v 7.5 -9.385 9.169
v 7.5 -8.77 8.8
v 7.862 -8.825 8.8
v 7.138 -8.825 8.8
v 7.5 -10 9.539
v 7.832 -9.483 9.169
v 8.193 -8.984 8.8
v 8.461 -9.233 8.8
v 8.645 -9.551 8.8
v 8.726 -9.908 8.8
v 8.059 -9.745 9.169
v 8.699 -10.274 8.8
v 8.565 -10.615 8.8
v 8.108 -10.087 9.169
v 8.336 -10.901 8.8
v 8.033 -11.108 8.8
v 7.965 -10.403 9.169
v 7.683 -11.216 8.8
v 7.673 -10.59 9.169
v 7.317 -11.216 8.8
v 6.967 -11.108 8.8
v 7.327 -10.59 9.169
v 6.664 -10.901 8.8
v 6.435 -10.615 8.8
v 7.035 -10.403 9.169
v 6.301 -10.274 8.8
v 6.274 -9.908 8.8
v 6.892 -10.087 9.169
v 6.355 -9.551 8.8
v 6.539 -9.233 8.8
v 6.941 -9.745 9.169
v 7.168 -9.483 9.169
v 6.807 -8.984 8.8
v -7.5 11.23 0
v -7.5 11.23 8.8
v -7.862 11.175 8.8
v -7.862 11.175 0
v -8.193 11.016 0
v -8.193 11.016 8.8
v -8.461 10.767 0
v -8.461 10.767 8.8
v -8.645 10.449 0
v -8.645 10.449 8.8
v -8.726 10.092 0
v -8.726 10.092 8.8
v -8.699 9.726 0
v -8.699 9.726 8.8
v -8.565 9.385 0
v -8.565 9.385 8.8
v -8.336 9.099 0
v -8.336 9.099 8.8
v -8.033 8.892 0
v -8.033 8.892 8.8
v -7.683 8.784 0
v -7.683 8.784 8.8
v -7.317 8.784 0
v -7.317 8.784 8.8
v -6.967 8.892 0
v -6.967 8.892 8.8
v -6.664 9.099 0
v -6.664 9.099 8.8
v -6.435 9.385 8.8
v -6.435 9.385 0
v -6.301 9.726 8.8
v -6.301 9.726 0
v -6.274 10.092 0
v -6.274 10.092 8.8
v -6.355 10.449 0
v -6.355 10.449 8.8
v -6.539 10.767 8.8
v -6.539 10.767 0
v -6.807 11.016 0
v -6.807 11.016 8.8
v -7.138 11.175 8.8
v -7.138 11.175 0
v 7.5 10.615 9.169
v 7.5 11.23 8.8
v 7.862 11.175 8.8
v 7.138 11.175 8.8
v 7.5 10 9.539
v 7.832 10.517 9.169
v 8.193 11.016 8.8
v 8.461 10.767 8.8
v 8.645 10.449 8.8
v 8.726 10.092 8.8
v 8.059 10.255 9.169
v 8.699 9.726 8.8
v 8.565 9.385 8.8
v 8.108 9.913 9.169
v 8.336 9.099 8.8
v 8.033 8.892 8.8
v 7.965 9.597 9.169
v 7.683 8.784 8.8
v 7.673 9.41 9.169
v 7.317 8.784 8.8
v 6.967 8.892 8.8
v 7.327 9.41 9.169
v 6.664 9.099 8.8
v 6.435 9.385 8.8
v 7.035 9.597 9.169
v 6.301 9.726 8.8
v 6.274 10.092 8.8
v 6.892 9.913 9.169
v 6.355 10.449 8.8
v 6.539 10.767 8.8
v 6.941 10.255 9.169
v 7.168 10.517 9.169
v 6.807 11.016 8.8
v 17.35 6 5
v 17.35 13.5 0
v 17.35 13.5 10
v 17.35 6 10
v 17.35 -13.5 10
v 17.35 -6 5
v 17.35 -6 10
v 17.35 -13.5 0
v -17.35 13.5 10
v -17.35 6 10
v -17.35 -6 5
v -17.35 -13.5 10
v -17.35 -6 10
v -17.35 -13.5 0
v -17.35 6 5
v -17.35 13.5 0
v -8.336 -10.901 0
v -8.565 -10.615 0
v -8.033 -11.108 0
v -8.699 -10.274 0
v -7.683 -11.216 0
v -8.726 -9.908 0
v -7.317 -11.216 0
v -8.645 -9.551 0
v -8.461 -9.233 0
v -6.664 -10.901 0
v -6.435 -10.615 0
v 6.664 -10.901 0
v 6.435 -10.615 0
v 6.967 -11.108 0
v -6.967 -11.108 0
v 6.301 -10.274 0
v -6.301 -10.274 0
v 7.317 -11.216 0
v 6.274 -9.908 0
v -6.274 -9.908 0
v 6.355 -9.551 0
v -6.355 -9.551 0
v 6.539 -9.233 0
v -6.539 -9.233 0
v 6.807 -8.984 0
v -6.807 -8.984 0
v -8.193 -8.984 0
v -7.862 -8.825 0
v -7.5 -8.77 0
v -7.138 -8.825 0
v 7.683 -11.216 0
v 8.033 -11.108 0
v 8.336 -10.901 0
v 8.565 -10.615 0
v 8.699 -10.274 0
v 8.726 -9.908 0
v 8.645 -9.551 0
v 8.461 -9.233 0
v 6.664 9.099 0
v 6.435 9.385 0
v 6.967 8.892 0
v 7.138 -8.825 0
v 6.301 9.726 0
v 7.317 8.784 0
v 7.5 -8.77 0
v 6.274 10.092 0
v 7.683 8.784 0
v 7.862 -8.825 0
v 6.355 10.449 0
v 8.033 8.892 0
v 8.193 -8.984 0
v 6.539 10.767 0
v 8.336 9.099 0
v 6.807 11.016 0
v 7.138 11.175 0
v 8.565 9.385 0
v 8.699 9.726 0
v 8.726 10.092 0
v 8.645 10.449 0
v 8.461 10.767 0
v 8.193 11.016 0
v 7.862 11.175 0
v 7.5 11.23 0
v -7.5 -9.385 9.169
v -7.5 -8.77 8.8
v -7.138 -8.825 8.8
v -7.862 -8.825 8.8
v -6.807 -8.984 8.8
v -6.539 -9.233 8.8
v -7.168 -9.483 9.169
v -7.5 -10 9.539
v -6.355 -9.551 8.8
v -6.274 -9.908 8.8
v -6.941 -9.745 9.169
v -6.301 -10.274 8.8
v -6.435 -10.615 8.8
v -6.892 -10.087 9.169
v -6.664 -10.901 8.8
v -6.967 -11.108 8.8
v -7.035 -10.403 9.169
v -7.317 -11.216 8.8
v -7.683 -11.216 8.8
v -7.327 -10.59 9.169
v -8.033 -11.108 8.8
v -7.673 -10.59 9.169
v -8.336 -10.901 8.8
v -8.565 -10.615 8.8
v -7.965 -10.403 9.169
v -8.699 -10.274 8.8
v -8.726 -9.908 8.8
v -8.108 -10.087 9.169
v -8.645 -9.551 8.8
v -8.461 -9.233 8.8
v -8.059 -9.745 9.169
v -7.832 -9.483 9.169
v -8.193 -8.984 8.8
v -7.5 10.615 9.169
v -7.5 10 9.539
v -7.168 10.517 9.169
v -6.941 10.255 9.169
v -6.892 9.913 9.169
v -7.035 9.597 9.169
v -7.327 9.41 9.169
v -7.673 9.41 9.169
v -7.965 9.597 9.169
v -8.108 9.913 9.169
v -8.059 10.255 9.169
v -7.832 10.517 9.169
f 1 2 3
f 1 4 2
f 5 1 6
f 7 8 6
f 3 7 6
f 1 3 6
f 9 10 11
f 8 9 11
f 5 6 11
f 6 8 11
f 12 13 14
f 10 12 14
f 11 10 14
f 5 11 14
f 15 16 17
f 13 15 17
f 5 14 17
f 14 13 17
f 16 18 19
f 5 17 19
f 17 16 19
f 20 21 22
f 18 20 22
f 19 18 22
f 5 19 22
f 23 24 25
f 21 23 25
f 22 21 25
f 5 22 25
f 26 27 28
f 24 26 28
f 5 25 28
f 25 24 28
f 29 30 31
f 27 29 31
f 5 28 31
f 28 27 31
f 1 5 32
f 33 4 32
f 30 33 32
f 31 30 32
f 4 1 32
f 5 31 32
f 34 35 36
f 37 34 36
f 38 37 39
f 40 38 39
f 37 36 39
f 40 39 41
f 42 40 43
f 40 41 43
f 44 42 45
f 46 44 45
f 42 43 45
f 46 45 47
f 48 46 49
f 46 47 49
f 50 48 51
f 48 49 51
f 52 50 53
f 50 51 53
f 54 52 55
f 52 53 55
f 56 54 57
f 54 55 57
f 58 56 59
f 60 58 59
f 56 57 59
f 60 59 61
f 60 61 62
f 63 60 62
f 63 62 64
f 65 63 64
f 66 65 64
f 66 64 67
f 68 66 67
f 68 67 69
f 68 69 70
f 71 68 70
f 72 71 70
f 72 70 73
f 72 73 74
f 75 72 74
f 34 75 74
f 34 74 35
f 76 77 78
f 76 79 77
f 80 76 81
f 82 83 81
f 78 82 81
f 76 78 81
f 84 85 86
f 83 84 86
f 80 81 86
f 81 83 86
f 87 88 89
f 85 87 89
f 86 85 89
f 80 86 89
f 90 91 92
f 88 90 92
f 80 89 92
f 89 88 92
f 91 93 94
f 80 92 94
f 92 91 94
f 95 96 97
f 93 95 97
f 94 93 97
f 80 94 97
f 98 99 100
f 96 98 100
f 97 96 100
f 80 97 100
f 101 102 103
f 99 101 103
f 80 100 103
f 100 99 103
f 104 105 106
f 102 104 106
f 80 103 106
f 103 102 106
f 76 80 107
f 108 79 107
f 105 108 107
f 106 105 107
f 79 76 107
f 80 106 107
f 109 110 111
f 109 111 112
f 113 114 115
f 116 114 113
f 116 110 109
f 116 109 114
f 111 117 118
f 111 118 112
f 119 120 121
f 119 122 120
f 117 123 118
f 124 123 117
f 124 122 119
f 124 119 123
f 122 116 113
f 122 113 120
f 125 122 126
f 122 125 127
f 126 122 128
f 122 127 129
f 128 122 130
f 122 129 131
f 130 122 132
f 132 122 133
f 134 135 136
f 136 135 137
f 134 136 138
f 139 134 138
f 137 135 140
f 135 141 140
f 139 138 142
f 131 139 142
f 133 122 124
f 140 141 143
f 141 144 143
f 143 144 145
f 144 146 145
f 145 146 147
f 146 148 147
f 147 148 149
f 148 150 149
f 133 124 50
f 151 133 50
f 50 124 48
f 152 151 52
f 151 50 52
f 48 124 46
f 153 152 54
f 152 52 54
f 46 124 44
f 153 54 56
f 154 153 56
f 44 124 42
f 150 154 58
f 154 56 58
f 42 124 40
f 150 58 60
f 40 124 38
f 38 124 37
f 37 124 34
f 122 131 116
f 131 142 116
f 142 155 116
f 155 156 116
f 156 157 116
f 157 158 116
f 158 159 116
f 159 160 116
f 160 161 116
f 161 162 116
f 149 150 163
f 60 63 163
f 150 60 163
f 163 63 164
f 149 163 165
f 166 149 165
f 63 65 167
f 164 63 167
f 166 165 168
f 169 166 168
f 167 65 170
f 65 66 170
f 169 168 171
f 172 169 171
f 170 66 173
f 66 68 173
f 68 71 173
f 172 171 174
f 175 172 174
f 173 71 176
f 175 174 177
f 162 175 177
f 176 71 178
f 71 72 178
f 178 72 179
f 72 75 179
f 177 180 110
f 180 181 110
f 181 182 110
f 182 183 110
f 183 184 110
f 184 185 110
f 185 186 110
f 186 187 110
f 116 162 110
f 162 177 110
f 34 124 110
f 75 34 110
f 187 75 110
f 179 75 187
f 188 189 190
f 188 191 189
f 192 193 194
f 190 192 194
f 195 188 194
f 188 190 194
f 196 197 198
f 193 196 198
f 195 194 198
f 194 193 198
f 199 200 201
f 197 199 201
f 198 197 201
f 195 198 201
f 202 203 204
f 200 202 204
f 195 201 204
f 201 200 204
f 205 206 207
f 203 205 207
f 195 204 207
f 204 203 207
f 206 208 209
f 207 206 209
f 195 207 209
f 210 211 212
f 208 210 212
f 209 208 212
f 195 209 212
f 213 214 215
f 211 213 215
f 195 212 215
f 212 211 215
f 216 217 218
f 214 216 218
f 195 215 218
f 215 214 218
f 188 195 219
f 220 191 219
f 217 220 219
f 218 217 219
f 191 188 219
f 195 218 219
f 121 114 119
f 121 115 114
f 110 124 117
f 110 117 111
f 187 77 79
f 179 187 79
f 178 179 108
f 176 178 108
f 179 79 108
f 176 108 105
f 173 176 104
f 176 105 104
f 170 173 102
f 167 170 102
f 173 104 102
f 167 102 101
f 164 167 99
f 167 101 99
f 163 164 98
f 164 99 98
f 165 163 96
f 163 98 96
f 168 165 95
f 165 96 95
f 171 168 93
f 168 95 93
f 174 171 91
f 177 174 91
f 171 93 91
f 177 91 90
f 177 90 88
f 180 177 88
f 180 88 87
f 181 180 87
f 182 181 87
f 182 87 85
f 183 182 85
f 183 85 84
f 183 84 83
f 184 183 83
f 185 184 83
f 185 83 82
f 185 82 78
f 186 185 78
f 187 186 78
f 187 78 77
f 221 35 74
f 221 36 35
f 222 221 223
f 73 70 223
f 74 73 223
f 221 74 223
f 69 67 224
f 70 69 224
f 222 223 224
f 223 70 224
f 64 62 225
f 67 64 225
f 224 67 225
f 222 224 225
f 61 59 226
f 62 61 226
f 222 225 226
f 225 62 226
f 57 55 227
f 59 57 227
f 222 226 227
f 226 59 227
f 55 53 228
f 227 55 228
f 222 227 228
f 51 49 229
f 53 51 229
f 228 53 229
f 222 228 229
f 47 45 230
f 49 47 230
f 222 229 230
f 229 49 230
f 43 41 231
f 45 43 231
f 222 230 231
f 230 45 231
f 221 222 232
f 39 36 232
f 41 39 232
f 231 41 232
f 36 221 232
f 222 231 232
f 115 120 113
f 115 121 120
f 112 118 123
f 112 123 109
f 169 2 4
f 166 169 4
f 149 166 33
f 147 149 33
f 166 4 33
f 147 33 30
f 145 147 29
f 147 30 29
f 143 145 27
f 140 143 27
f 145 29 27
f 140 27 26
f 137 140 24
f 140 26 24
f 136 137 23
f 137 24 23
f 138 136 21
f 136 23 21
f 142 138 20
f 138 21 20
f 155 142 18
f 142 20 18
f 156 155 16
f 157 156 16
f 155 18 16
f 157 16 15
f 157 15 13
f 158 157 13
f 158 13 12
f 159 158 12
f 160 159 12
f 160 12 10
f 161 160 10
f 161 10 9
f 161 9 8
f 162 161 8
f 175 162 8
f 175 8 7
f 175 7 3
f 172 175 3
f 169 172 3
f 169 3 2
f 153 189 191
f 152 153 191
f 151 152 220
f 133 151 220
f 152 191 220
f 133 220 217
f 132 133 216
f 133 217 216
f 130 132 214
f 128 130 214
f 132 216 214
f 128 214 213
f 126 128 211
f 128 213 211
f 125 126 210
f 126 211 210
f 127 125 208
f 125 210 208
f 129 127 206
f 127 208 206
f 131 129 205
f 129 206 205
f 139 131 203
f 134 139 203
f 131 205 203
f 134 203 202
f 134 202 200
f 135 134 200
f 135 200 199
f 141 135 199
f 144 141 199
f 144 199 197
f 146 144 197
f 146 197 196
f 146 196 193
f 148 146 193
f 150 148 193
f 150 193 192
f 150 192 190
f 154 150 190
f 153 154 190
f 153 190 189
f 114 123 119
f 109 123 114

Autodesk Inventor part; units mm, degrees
ref_plane "YZ Plane" through (0, 0, 0) normal (1, 0, 0) x (0, 1, 0)
ref_plane "XZ Plane" through (0, 0, 0) normal (0, 1, 0) x (-1, 0, 0)
ref_plane "XY Plane" through (0, 0, 0) normal (0, 0, 1) x (1, 0, 0)
sketch "Sketch1" plane through (0, 0, 0) normal (0, 0, 1) x (1, 0, 0)
  line L0 (17.35, -13.5) -> (-17.35, -13.5)
  line L1 (-17.35, -13.5) -> (-17.35, 13.5)
  line L2 (-17.35, 13.5) -> (17.35, 13.5)
  line L3 (17.35, 13.5) -> (17.35, -13.5)
  line L4 (17.35, -13.5) -> (-17.35, 13.5) construction
  line L5 (-17.35, -13.5) -> (17.35, 13.5) construction
  point P0 (0, 0)
  dimension "d0" = 27
  dimension "d1" = 34.7
extrude "Extrusion1" add sketch "Sketch1" along normal blind 10
sketch "Sketch2" plane through (0, 0, 10) normal (0, 0, 1) x (1, 0, 0)
  line L0 (17.35, -6) -> (-17.35, -6)
  line L1 (-17.35, -6) -> (-17.35, 6)
  line L2 (-17.35, 6) -> (17.35, 6)
  line L3 (17.35, 6) -> (17.35, -6)
  line L4 (17.35, -6) -> (-17.35, 6) construction
  line L5 (-17.35, -6) -> (17.35, 6) construction
  point P0 (0, 0)
  point P1 (17.35, 13.5)
  dimension "d4" = 12
extrude "Extrusion2" cut sketch "Sketch2" against normal blind 5
sketch "Sketch3" plane through (0, 0, 0) normal (0, 0, -1) x (-1, 0, 0)
  point P0 (0, 0)
  point P1 (-7.5, 10)
  point P2 (-7.5, -10)
  point P3 (7.5, 10)
  point P4 (7.5, -10)
  dimension "d7" = 20
  dimension "d8" = 10
  dimension "d9" = 15
  dimension "d10" = 7.5
hole "Hole1" at (7.5, 10, 0) at (7.5, -10, 0) at (-7.5, 10, 0) at (-7.5, -10, 0) direction (0, 0, 1) diameter 2.459 depth 8.8 tip angle 118 thread size "M3x0.5" class "6H" standard "ISO Metric profile"
equation "\"d8\" = 0.5 * d7"
equation "\"d10\" = 0.5 * d9"
properties part number "MGN12C" material "Stainless Steel"
